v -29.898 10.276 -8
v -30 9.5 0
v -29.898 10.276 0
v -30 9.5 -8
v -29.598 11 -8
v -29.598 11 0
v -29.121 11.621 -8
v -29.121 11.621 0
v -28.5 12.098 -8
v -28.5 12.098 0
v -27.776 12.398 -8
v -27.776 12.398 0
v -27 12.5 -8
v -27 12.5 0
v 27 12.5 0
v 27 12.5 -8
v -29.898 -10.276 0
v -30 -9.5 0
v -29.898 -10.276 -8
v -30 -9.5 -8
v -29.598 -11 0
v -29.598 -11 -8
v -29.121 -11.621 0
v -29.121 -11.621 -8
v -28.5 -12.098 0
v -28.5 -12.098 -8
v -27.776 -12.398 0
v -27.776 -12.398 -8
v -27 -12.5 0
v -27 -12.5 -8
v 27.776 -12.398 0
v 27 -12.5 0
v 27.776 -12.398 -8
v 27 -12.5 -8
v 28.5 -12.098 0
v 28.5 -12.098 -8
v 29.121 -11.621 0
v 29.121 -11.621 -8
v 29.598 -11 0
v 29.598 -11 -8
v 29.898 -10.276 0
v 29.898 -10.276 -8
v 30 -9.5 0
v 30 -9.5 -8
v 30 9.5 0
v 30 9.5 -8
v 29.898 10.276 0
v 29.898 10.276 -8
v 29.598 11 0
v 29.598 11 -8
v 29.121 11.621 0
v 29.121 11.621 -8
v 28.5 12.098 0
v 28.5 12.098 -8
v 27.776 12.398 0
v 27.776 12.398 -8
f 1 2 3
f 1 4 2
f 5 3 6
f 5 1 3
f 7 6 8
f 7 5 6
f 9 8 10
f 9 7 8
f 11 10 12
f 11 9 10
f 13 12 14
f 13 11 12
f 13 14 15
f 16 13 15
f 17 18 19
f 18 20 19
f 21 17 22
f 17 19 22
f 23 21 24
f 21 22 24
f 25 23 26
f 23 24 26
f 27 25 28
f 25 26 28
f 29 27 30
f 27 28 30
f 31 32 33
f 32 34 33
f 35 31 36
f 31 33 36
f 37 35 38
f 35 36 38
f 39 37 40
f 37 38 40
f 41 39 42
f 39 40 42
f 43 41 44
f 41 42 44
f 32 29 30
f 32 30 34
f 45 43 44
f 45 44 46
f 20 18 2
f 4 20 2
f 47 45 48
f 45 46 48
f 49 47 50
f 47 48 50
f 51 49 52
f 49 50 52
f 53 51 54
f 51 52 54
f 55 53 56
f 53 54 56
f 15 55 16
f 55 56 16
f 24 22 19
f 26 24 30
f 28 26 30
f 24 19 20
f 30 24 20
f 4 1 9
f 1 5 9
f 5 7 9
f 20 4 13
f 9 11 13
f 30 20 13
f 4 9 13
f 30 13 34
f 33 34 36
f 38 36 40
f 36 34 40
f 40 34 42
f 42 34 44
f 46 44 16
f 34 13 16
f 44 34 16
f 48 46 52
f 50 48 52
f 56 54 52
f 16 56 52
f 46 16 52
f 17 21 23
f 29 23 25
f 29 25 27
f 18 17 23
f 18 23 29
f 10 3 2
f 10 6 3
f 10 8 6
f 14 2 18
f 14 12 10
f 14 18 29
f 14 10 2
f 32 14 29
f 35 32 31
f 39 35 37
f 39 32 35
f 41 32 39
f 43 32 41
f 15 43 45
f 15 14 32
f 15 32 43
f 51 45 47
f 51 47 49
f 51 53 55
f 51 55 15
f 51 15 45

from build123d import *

# Parameters (mm, degrees)
IZIM1_W            = 60
IZIM1_H            = 25
TABAN_FLAN_1_DEPTH = 8
RADYUS1_R          = 3


# Sheet-metal steps are written as plain solids
with BuildPart() as part:
    # Çizim1 → Taban-Flanş1 (new body)
    with BuildSketch(Plane.XY):
        Rectangle(IZIM1_W, IZIM1_H)
    extrude(amount=-TABAN_FLAN_1_DEPTH)

    # Radyus1
    radyus1_edges = [part.edges().sort_by_distance(p)[0] for p in [
        (30, -12.5, -4),
        (-30, -12.5, -4),
        (-30, 12.5, -4),
        (30, 12.5, -4),
    ]]
    fillet(radyus1_edges, radius=RADYUS1_R)


solid = part.part
